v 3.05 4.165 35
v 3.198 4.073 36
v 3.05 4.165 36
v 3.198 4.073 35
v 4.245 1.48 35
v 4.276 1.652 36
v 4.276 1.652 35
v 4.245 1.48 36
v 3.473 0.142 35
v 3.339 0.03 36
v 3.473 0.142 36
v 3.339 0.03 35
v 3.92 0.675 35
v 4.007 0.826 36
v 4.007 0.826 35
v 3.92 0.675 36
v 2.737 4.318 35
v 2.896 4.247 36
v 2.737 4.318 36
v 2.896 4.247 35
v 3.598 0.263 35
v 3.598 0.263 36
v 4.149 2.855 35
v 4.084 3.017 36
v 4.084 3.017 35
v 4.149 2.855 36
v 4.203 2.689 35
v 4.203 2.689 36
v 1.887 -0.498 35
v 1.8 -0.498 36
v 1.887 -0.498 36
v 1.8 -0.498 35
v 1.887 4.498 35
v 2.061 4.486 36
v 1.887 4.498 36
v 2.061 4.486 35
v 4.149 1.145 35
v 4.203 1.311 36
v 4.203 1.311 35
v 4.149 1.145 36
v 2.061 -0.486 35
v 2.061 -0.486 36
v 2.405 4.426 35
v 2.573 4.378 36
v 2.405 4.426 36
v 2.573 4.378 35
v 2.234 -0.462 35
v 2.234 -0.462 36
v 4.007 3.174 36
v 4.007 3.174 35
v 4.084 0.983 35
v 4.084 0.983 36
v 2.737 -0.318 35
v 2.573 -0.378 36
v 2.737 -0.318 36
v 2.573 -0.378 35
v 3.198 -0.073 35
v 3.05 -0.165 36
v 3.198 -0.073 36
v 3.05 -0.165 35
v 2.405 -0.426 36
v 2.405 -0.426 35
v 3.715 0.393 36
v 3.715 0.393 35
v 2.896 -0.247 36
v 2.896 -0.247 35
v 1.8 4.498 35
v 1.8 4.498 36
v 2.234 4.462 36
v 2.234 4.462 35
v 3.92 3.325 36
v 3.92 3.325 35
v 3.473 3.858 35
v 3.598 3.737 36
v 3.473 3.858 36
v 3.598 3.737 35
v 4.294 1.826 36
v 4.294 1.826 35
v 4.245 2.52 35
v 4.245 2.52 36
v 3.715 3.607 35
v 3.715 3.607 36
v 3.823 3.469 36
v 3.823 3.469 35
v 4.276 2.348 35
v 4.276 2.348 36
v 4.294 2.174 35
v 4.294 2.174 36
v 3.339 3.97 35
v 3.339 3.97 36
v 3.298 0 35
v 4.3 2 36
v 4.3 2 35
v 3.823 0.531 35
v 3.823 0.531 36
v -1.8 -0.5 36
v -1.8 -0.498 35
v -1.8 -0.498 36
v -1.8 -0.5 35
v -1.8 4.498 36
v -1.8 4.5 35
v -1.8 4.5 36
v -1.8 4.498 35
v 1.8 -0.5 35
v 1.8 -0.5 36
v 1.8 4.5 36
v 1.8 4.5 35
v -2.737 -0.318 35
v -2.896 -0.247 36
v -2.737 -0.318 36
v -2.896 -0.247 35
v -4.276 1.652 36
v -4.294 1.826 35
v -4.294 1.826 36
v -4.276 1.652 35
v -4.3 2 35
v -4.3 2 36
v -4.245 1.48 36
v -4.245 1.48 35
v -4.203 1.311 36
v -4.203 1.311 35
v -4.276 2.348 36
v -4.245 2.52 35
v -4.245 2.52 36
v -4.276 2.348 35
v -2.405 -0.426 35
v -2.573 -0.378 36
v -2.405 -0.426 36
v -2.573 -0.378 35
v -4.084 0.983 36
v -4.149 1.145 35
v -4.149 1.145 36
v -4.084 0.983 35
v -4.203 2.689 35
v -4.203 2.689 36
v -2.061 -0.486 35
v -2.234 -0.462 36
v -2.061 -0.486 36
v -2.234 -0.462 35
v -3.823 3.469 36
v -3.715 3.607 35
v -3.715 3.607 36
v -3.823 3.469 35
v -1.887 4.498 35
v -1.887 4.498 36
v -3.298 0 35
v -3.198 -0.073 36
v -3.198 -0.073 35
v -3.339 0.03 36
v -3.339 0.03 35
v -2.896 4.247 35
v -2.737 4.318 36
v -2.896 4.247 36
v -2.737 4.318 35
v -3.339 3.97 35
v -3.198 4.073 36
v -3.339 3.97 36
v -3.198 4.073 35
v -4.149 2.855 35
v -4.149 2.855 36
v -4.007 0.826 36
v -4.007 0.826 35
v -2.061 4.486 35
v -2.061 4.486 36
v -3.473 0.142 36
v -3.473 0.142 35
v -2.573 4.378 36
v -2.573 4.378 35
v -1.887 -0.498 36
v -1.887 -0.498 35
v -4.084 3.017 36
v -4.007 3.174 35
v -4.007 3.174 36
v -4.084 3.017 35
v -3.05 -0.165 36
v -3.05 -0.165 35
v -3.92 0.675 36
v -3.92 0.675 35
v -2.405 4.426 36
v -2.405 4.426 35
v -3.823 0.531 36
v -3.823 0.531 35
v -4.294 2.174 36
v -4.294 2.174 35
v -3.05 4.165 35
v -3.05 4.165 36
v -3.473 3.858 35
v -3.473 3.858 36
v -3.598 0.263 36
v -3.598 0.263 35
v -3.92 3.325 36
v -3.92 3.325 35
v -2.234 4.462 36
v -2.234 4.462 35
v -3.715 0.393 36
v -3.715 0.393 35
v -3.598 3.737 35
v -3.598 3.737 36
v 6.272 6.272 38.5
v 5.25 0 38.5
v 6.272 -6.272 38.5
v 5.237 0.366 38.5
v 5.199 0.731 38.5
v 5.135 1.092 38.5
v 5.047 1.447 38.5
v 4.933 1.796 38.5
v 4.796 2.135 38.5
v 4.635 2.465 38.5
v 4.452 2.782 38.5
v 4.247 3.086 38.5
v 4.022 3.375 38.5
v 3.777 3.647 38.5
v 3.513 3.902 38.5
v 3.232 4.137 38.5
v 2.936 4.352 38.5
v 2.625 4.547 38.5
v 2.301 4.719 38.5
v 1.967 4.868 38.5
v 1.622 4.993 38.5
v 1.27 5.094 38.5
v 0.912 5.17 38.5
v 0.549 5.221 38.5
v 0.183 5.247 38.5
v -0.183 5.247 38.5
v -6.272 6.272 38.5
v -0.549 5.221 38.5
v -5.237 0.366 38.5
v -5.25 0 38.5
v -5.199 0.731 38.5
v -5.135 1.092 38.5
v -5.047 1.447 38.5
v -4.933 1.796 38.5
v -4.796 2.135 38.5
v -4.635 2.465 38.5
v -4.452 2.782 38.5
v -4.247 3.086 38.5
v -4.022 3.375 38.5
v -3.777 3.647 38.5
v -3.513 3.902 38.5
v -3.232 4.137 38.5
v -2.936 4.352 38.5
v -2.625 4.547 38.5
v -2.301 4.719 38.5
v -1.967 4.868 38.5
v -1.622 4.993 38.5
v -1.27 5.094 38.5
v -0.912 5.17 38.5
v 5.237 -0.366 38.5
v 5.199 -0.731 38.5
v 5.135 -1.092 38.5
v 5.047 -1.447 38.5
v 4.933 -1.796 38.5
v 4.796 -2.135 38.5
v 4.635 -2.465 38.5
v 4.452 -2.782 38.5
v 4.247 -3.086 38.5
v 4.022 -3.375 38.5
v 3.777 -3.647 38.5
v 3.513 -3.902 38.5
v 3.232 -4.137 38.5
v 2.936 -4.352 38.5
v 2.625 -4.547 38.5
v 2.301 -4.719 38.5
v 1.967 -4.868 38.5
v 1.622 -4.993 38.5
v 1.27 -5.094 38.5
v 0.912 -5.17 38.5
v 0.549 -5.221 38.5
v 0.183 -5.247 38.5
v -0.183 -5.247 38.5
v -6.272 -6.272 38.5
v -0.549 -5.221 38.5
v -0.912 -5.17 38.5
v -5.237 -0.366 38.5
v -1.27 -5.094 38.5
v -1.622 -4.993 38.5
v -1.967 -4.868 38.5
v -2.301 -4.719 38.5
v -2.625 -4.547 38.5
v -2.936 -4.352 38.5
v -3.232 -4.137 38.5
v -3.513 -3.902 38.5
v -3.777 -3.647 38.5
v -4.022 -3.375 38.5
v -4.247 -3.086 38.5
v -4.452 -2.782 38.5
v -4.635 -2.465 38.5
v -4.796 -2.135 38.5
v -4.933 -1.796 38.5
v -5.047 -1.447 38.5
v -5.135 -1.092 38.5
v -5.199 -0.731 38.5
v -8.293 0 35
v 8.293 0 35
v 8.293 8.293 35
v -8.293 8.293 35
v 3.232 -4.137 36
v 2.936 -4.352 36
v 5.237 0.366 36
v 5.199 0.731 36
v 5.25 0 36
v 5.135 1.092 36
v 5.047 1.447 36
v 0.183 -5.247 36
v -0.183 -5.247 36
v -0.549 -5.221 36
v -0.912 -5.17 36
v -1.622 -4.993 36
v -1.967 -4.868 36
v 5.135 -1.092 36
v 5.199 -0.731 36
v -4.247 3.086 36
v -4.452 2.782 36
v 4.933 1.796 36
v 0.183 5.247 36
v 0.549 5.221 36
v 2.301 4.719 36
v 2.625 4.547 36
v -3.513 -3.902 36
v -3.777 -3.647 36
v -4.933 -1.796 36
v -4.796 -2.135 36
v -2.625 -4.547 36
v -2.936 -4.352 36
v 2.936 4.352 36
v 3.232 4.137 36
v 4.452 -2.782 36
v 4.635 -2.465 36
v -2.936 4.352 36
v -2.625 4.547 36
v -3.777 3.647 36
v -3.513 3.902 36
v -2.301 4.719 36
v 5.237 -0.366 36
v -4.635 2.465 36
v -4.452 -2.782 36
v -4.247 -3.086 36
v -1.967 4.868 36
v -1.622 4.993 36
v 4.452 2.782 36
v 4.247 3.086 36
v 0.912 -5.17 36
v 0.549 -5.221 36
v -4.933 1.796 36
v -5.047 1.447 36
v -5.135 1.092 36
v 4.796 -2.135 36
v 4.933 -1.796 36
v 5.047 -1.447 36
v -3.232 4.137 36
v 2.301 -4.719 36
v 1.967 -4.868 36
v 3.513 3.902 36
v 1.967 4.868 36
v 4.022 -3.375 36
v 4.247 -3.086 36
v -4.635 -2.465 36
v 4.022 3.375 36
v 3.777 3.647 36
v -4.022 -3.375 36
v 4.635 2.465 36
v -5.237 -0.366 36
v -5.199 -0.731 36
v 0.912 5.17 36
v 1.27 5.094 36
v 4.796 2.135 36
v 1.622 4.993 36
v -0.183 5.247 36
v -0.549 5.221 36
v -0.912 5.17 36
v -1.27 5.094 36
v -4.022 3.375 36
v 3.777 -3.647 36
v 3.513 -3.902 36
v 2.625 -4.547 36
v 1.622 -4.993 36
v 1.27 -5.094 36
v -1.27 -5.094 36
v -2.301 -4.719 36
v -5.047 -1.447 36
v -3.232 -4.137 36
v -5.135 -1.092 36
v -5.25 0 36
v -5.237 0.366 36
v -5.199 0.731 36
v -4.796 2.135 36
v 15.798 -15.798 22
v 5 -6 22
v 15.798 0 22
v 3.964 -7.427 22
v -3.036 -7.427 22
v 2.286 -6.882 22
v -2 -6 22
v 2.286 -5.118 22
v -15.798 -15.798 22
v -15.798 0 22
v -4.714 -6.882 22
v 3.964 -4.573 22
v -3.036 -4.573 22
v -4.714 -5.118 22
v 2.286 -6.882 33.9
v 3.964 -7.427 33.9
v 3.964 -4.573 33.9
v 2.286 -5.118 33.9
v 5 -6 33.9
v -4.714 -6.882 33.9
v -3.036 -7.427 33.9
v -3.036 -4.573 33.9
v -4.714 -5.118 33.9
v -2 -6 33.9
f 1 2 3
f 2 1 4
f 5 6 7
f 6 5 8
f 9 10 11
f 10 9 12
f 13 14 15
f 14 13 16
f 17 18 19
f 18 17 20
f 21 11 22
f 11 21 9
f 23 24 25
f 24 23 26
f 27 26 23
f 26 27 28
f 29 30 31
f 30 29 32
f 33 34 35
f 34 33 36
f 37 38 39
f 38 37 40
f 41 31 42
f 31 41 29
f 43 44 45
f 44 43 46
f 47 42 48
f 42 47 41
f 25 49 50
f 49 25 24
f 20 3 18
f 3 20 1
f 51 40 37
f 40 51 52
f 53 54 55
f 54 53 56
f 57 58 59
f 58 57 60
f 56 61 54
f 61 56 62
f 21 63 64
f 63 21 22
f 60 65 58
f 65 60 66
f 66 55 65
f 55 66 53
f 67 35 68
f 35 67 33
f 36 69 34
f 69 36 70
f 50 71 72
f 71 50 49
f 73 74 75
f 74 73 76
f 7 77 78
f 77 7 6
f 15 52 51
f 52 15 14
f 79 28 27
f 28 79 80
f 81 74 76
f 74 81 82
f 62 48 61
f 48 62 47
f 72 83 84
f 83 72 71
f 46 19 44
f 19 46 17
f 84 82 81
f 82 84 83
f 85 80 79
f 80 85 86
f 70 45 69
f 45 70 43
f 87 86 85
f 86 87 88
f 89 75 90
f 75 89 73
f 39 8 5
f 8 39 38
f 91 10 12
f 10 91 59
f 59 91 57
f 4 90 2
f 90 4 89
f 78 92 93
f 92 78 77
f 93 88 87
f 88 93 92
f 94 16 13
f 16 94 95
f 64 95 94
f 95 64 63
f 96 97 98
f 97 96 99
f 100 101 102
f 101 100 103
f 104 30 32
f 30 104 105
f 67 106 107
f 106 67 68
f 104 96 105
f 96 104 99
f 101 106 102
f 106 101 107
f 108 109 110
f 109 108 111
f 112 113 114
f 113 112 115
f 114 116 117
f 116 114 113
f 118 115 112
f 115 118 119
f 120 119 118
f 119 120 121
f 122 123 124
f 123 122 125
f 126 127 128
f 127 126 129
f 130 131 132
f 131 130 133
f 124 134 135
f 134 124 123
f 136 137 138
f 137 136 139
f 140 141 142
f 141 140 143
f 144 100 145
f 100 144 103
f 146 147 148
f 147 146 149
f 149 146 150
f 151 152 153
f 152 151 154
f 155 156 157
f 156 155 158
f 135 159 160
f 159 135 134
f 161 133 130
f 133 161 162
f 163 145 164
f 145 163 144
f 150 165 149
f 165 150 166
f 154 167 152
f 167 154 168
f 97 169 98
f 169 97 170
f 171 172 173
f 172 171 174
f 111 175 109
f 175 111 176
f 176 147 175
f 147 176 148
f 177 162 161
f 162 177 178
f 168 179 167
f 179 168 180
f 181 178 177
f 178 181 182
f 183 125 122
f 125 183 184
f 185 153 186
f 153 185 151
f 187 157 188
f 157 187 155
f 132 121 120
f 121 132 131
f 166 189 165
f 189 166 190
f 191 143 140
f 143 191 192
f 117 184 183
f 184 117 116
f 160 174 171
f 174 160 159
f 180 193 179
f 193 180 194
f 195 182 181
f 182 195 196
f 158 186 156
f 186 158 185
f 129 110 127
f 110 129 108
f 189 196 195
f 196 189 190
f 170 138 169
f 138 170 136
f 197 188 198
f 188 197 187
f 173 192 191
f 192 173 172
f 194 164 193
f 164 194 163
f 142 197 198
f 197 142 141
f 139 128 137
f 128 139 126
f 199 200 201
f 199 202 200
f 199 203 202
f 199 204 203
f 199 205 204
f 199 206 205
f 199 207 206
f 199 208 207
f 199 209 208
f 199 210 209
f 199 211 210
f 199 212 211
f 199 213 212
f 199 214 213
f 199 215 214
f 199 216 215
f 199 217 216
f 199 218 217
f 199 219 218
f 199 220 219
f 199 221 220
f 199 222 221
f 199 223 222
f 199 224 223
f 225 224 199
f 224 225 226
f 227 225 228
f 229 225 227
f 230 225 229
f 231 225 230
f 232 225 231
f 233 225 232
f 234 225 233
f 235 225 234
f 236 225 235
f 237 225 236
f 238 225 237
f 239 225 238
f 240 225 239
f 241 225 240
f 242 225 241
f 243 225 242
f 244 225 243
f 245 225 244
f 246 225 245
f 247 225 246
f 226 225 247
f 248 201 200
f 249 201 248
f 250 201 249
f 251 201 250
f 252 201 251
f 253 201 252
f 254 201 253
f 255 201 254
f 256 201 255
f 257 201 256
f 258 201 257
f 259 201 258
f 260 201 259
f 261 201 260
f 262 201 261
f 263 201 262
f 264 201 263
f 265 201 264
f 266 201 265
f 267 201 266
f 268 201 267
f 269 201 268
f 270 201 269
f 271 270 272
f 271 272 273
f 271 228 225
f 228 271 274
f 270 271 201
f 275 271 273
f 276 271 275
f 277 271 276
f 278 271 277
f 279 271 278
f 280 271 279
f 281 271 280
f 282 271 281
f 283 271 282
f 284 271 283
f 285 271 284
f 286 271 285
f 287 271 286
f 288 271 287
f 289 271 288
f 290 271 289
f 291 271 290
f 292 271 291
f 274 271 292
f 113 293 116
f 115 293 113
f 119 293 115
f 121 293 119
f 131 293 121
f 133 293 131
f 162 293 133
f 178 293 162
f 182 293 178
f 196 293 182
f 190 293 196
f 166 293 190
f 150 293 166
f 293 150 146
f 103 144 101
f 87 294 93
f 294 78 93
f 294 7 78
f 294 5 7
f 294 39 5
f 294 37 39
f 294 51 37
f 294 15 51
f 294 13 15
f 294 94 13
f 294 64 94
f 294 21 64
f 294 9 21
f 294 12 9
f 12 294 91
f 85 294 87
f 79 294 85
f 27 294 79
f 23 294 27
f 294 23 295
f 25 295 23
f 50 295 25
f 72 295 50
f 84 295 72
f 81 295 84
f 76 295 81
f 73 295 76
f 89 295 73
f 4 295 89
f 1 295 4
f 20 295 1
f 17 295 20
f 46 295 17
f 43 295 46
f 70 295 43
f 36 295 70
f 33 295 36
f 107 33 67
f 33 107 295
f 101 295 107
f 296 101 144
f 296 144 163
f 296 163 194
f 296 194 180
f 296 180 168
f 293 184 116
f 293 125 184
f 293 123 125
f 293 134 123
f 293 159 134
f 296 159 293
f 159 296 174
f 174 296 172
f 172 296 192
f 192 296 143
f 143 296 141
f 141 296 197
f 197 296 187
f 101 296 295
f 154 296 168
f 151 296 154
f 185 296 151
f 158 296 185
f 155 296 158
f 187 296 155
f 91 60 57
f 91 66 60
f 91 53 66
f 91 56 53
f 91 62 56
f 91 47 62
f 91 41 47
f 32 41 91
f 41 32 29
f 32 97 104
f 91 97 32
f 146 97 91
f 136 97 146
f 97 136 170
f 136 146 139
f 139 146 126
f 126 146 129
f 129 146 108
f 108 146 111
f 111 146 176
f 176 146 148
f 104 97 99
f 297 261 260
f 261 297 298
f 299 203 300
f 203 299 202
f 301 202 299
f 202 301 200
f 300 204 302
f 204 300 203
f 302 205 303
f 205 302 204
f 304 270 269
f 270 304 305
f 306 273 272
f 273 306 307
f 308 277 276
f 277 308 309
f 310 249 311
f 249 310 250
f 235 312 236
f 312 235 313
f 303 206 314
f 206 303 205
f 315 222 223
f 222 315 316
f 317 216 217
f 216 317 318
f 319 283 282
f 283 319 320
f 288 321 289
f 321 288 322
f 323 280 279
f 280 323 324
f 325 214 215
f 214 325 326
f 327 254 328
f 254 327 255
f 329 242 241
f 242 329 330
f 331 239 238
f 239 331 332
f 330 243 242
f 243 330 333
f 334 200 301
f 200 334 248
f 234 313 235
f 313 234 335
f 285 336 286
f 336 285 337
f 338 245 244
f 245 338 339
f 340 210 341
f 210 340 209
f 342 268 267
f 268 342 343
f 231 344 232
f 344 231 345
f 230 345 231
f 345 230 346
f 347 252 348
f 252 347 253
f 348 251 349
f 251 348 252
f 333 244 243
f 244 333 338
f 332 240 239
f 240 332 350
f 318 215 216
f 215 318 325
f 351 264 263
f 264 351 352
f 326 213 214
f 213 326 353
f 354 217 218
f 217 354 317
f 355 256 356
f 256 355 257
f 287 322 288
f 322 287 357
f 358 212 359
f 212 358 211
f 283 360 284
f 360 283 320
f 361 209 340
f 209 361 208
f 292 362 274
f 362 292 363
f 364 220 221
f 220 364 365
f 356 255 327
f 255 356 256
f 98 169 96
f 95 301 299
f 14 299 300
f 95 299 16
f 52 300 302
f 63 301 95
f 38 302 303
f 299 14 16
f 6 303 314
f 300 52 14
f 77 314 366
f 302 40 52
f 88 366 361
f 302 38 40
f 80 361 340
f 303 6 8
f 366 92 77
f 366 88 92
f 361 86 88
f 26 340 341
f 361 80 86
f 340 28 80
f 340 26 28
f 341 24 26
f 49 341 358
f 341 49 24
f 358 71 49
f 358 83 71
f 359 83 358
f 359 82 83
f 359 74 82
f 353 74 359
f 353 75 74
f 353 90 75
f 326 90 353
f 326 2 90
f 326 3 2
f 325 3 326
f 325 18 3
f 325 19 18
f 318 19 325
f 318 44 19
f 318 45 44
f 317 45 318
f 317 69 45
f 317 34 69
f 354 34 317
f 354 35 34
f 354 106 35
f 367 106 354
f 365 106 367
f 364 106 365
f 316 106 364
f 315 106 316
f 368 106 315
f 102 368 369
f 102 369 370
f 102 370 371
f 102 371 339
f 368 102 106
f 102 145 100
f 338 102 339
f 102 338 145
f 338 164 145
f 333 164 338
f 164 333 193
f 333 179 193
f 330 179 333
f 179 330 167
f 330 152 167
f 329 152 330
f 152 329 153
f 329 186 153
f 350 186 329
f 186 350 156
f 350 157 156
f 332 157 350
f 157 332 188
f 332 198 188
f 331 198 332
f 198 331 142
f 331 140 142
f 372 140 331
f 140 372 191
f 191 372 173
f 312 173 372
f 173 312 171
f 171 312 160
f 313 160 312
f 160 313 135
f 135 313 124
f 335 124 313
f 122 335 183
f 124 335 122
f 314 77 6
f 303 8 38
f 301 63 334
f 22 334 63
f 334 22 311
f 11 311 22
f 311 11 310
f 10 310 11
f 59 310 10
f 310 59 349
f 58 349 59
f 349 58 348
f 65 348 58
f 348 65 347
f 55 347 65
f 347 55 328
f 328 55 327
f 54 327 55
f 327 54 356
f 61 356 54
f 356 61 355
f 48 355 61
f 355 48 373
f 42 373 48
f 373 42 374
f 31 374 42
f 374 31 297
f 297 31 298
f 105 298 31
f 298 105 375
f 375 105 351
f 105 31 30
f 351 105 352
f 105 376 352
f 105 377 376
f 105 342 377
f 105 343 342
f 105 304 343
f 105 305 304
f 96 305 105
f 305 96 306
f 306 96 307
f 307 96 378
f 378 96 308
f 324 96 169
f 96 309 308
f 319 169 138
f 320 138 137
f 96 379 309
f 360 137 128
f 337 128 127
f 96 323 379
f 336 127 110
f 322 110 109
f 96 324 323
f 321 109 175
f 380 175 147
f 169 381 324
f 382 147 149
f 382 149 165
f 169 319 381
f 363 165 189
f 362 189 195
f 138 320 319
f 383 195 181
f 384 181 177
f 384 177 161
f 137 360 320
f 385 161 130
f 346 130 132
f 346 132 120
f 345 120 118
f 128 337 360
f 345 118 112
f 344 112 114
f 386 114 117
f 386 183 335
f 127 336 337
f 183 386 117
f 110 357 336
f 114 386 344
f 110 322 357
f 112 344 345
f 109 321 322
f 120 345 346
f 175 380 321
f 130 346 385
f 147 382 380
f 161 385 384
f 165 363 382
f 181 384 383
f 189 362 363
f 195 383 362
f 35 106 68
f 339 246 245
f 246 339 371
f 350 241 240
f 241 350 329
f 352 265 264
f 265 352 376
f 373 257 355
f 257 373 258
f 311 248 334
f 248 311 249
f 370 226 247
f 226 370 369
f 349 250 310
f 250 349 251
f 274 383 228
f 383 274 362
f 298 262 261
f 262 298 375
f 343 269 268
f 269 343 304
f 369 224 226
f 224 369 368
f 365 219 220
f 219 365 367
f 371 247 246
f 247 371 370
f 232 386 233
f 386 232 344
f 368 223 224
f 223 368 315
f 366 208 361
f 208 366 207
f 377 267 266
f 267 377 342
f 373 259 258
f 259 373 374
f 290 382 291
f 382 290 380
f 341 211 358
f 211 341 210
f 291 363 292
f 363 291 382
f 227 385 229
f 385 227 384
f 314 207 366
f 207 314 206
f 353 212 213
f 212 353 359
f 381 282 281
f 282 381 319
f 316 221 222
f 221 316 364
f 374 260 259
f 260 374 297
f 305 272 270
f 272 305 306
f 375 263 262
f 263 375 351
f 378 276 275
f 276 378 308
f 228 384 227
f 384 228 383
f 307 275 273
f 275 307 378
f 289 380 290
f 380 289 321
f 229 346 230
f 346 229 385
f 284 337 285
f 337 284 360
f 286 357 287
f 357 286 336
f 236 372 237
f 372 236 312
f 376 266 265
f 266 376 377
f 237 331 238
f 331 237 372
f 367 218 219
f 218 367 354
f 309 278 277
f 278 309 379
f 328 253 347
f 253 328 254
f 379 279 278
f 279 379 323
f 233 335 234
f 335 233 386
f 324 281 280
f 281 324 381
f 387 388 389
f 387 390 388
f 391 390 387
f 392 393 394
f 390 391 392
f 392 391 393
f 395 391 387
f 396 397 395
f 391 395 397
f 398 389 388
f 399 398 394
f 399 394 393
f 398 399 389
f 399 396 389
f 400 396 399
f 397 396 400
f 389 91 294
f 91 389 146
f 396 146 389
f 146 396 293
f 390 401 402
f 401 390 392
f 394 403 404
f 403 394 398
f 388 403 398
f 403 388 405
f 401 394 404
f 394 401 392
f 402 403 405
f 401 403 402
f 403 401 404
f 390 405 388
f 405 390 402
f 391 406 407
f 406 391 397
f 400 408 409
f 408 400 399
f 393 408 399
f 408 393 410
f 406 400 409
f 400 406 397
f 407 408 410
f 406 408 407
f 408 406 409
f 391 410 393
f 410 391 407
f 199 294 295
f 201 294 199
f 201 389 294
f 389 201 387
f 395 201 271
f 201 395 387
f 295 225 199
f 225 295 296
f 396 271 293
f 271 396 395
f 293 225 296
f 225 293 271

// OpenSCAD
/*
 * Kaminari
 *
 * Copyright (C) 2020 Richard "Shred" Körber
 *   https://github.com/shred/kaminari
 *
 * This program is free software: you can redistribute it and/or modify
 * it under the terms of the GNU General Public License as published by
 * the Free Software Foundation, either version 3 of the License, or
 * (at your option) any later version.
 *
 * This program is distributed in the hope that it will be useful,
 * but WITHOUT ANY WARRANTY; without even the implied warranty of
 * MERCHANTABILITY or FITNESS FOR A PARTICULAR PURPOSE.  See the
 * GNU General Public License for more details.
 */

use <kaminari.scad>
middle();
